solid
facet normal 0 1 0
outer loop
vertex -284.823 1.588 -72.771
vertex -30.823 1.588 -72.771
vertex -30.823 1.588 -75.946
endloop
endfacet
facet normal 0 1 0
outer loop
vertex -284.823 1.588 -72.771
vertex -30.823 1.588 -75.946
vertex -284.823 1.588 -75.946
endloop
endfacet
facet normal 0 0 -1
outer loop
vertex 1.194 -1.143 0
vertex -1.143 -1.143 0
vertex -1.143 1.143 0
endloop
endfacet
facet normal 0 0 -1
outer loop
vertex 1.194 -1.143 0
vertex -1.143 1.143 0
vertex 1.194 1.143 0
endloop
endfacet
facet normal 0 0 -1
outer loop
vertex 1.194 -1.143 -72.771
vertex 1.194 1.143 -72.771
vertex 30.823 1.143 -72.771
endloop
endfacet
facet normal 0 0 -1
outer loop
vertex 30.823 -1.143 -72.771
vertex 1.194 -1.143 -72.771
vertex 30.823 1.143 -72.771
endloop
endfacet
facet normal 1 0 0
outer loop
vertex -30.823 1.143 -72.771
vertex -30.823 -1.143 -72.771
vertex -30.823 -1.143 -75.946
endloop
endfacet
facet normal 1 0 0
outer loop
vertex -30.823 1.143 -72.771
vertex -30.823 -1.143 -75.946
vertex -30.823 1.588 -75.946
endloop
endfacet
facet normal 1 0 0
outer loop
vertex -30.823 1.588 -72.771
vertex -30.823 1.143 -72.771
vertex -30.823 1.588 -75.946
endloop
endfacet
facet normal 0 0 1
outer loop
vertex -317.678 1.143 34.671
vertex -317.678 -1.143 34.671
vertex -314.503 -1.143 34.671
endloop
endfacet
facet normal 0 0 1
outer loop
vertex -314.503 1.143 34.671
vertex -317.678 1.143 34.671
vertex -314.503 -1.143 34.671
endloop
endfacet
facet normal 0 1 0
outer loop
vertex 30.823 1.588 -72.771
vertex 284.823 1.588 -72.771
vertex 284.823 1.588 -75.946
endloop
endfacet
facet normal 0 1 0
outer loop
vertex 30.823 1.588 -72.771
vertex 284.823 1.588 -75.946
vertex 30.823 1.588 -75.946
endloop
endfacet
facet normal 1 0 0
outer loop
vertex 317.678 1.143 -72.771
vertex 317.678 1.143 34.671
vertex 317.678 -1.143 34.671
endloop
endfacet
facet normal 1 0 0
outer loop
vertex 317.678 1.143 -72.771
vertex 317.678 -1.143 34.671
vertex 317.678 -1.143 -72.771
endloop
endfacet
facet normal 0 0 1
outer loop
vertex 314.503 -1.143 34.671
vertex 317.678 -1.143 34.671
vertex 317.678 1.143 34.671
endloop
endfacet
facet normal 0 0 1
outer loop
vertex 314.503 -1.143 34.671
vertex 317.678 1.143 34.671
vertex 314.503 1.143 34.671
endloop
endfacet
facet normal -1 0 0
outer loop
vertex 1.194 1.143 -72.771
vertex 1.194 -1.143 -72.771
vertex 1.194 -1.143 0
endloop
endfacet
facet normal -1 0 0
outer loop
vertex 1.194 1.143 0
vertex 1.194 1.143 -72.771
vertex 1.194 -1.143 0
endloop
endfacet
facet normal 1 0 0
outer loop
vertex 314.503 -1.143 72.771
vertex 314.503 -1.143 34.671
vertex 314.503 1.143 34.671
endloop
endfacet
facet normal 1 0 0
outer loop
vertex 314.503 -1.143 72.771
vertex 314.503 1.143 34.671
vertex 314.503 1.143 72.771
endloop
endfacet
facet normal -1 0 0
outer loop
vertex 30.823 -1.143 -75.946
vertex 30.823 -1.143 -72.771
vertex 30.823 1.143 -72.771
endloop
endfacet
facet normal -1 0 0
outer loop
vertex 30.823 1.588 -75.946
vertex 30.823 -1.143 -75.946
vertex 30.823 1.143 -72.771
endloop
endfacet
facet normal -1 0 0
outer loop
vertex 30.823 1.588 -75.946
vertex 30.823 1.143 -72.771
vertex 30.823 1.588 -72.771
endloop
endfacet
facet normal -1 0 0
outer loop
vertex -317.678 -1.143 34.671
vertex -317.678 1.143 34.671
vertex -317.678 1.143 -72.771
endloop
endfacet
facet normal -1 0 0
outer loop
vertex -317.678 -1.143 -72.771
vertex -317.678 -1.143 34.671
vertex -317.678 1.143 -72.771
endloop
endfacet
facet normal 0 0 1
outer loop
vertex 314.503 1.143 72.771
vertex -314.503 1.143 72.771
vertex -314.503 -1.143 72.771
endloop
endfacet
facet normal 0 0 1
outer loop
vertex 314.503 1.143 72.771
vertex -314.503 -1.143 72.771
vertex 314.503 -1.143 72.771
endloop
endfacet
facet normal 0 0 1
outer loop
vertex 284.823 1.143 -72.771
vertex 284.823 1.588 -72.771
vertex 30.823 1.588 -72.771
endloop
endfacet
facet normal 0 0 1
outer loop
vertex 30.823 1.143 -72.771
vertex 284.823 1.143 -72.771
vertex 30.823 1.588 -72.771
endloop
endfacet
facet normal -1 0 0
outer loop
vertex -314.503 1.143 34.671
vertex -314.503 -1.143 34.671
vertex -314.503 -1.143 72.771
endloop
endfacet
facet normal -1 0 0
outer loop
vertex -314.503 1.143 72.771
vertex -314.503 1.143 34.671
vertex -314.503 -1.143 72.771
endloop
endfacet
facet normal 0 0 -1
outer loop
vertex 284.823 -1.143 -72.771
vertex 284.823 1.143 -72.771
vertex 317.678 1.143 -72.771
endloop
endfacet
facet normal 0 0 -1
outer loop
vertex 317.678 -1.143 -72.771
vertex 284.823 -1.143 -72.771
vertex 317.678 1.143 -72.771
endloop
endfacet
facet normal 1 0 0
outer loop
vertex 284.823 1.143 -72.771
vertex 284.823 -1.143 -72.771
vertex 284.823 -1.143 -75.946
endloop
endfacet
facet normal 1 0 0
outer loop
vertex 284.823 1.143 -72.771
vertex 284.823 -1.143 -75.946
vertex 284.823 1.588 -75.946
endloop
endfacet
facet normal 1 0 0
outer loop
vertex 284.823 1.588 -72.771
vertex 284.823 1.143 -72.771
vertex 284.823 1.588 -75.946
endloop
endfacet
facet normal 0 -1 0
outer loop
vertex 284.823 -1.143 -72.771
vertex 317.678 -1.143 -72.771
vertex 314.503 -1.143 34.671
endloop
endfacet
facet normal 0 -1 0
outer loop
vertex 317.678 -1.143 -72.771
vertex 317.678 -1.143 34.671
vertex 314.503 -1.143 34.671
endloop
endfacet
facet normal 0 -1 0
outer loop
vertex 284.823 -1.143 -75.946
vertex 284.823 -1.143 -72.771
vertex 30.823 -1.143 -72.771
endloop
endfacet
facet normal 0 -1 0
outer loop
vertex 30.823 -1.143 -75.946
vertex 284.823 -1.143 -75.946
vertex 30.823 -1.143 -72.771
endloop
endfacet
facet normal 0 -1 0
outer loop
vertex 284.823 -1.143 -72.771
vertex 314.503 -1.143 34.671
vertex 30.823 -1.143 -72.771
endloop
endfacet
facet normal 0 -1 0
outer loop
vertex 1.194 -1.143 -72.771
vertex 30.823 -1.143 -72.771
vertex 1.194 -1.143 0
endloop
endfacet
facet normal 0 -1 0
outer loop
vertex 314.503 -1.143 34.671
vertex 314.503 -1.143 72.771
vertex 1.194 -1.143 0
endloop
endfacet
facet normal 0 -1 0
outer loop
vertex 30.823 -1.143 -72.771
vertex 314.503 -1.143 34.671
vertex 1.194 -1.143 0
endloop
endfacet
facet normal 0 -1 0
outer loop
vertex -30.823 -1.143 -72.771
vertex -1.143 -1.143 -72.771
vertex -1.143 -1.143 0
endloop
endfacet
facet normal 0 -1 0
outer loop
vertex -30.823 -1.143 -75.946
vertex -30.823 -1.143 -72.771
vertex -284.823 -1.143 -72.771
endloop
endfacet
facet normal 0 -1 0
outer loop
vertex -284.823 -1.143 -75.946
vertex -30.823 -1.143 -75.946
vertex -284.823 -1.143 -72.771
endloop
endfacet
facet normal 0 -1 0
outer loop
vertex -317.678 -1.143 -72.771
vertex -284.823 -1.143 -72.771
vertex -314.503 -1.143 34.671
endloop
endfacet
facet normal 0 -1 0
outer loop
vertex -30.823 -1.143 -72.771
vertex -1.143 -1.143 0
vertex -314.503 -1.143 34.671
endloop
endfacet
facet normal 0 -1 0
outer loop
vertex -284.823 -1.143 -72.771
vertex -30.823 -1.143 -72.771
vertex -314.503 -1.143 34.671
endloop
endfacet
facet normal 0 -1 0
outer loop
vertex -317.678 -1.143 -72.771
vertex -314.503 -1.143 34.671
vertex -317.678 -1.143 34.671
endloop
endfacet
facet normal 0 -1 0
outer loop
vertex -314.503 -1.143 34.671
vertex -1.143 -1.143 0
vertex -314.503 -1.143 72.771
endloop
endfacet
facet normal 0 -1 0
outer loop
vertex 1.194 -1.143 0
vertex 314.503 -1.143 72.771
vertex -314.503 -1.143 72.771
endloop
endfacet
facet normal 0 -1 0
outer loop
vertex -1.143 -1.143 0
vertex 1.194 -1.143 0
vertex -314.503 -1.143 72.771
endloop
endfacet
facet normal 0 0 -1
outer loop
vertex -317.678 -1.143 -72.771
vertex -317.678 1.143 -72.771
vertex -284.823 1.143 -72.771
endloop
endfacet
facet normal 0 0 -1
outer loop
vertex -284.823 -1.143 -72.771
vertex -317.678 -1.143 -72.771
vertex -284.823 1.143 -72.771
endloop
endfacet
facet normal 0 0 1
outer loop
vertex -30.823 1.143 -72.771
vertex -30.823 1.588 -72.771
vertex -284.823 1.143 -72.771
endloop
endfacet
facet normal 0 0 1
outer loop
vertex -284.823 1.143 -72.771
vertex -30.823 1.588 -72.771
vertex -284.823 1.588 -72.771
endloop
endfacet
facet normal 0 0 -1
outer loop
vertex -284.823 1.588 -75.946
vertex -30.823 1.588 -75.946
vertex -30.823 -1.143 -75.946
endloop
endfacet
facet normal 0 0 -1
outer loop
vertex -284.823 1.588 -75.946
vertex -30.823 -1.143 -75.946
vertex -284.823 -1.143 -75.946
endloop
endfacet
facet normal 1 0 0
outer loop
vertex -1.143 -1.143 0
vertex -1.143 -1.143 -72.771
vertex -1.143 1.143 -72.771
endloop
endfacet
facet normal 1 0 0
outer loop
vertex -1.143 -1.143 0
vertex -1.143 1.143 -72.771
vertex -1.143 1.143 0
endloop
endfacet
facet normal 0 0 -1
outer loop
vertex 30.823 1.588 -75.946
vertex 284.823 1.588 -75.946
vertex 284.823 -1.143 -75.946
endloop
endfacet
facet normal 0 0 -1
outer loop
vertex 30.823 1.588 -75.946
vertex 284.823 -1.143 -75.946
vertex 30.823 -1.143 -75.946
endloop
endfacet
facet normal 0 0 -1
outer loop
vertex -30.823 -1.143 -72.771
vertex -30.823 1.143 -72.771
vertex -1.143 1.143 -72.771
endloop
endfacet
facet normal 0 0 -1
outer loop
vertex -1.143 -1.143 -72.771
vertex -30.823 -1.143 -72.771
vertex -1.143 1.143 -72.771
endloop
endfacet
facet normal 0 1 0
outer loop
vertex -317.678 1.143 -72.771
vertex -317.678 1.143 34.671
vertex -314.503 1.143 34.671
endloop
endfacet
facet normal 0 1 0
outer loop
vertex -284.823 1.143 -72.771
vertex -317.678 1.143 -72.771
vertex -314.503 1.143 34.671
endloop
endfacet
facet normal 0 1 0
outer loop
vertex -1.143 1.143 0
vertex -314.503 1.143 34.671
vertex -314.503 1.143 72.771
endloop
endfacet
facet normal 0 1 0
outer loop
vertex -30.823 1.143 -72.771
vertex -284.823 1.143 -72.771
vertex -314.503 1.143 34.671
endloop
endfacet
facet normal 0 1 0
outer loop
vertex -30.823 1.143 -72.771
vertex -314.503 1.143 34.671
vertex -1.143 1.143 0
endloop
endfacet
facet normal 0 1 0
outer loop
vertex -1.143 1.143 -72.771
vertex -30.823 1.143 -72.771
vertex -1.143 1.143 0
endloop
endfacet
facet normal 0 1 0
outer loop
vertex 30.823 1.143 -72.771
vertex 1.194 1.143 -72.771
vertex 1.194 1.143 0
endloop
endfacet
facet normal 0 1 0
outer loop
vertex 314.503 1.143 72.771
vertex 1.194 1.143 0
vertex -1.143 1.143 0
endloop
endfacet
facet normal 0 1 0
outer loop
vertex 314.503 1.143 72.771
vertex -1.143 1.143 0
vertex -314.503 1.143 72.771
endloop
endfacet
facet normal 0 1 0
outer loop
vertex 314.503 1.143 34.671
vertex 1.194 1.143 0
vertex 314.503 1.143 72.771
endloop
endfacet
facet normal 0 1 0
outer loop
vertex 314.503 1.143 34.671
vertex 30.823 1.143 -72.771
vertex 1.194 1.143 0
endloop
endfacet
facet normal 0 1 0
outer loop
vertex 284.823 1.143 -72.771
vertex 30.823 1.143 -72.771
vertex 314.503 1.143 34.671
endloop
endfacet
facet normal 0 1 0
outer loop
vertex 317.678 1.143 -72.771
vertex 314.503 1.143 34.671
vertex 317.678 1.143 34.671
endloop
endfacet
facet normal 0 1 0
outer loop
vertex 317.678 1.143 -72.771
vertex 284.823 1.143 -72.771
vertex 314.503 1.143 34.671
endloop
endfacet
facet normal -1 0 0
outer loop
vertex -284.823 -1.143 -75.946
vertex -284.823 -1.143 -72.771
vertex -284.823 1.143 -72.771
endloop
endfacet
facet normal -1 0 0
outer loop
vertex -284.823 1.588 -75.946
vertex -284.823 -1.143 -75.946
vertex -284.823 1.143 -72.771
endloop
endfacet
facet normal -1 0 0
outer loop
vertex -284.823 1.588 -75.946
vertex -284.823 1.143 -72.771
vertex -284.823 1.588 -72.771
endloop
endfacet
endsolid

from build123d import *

# Parameters (mm, degrees)
SKETCH1_W           = 635.3556
SKETCH1_H           = 145.542
BOSS_EXTRUDE1_DEPTH = 1.143
SKETCH2_W           = 254
SKETCH2_H           = 2.7305
BOSS_EXTRUDE2_DEPTH = 3.175
SKETCH3_W           = 3.175
SKETCH3_H           = 38.1
CUT_EXTRUDE1_DEPTH  = 3.7305
SKETCH4_W           = 2.3368
SKETCH4_H           = 72.771
CUT_EXTRUDE2_DEPTH  = 3.7305


with BuildPart() as part:
    # Sketch1 → Boss-Extrude1 (new body, symmetric)
    with BuildSketch(Plane(origin=(0, 0, 0), x_dir=(1, 0, 0), z_dir=(0, 1, 0))):
        Rectangle(SKETCH1_W, SKETCH1_H)
    extrude(amount=BOSS_EXTRUDE1_DEPTH, both=True)

    # Sketch2 → Boss-Extrude2 (add)
    with BuildSketch(Plane(origin=(0, 0, -72.771), x_dir=(-1, 0, 0), z_dir=(0, 0, -1))):
        with Locations((-157.8229, 0.22225)):
            Rectangle(SKETCH2_W, SKETCH2_H)
        with Locations((157.8229, 0.22225)):
            Rectangle(SKETCH2_W, SKETCH2_H)
    extrude(amount=BOSS_EXTRUDE2_DEPTH)

    # Sketch3 → Cut-Extrude1 (cut, through all)
    with BuildSketch(Plane.XZ.offset(1.143)):
        with Locations((-316.0903, 53.721)):
            Rectangle(SKETCH3_W, SKETCH3_H)
    cut_extrude1 = extrude(amount=-CUT_EXTRUDE1_DEPTH, mode=Mode.SUBTRACT)

    # Mirror1: Cut-Extrude1 across plane
    add(cut_extrude1.mirror(Plane(origin=(0, 0, 0), x_dir=(0, 0, 1), z_dir=(1, 0, 0))), mode=Mode.SUBTRACT)

    # Sketch4 → Cut-Extrude2 (cut, through all)
    with BuildSketch(Plane.XZ.offset(1.143)):
        with Locations((0.0254, -36.3855)):
            Rectangle(SKETCH4_W, SKETCH4_H)
    extrude(amount=-CUT_EXTRUDE2_DEPTH, mode=Mode.SUBTRACT)


solid = part.part
